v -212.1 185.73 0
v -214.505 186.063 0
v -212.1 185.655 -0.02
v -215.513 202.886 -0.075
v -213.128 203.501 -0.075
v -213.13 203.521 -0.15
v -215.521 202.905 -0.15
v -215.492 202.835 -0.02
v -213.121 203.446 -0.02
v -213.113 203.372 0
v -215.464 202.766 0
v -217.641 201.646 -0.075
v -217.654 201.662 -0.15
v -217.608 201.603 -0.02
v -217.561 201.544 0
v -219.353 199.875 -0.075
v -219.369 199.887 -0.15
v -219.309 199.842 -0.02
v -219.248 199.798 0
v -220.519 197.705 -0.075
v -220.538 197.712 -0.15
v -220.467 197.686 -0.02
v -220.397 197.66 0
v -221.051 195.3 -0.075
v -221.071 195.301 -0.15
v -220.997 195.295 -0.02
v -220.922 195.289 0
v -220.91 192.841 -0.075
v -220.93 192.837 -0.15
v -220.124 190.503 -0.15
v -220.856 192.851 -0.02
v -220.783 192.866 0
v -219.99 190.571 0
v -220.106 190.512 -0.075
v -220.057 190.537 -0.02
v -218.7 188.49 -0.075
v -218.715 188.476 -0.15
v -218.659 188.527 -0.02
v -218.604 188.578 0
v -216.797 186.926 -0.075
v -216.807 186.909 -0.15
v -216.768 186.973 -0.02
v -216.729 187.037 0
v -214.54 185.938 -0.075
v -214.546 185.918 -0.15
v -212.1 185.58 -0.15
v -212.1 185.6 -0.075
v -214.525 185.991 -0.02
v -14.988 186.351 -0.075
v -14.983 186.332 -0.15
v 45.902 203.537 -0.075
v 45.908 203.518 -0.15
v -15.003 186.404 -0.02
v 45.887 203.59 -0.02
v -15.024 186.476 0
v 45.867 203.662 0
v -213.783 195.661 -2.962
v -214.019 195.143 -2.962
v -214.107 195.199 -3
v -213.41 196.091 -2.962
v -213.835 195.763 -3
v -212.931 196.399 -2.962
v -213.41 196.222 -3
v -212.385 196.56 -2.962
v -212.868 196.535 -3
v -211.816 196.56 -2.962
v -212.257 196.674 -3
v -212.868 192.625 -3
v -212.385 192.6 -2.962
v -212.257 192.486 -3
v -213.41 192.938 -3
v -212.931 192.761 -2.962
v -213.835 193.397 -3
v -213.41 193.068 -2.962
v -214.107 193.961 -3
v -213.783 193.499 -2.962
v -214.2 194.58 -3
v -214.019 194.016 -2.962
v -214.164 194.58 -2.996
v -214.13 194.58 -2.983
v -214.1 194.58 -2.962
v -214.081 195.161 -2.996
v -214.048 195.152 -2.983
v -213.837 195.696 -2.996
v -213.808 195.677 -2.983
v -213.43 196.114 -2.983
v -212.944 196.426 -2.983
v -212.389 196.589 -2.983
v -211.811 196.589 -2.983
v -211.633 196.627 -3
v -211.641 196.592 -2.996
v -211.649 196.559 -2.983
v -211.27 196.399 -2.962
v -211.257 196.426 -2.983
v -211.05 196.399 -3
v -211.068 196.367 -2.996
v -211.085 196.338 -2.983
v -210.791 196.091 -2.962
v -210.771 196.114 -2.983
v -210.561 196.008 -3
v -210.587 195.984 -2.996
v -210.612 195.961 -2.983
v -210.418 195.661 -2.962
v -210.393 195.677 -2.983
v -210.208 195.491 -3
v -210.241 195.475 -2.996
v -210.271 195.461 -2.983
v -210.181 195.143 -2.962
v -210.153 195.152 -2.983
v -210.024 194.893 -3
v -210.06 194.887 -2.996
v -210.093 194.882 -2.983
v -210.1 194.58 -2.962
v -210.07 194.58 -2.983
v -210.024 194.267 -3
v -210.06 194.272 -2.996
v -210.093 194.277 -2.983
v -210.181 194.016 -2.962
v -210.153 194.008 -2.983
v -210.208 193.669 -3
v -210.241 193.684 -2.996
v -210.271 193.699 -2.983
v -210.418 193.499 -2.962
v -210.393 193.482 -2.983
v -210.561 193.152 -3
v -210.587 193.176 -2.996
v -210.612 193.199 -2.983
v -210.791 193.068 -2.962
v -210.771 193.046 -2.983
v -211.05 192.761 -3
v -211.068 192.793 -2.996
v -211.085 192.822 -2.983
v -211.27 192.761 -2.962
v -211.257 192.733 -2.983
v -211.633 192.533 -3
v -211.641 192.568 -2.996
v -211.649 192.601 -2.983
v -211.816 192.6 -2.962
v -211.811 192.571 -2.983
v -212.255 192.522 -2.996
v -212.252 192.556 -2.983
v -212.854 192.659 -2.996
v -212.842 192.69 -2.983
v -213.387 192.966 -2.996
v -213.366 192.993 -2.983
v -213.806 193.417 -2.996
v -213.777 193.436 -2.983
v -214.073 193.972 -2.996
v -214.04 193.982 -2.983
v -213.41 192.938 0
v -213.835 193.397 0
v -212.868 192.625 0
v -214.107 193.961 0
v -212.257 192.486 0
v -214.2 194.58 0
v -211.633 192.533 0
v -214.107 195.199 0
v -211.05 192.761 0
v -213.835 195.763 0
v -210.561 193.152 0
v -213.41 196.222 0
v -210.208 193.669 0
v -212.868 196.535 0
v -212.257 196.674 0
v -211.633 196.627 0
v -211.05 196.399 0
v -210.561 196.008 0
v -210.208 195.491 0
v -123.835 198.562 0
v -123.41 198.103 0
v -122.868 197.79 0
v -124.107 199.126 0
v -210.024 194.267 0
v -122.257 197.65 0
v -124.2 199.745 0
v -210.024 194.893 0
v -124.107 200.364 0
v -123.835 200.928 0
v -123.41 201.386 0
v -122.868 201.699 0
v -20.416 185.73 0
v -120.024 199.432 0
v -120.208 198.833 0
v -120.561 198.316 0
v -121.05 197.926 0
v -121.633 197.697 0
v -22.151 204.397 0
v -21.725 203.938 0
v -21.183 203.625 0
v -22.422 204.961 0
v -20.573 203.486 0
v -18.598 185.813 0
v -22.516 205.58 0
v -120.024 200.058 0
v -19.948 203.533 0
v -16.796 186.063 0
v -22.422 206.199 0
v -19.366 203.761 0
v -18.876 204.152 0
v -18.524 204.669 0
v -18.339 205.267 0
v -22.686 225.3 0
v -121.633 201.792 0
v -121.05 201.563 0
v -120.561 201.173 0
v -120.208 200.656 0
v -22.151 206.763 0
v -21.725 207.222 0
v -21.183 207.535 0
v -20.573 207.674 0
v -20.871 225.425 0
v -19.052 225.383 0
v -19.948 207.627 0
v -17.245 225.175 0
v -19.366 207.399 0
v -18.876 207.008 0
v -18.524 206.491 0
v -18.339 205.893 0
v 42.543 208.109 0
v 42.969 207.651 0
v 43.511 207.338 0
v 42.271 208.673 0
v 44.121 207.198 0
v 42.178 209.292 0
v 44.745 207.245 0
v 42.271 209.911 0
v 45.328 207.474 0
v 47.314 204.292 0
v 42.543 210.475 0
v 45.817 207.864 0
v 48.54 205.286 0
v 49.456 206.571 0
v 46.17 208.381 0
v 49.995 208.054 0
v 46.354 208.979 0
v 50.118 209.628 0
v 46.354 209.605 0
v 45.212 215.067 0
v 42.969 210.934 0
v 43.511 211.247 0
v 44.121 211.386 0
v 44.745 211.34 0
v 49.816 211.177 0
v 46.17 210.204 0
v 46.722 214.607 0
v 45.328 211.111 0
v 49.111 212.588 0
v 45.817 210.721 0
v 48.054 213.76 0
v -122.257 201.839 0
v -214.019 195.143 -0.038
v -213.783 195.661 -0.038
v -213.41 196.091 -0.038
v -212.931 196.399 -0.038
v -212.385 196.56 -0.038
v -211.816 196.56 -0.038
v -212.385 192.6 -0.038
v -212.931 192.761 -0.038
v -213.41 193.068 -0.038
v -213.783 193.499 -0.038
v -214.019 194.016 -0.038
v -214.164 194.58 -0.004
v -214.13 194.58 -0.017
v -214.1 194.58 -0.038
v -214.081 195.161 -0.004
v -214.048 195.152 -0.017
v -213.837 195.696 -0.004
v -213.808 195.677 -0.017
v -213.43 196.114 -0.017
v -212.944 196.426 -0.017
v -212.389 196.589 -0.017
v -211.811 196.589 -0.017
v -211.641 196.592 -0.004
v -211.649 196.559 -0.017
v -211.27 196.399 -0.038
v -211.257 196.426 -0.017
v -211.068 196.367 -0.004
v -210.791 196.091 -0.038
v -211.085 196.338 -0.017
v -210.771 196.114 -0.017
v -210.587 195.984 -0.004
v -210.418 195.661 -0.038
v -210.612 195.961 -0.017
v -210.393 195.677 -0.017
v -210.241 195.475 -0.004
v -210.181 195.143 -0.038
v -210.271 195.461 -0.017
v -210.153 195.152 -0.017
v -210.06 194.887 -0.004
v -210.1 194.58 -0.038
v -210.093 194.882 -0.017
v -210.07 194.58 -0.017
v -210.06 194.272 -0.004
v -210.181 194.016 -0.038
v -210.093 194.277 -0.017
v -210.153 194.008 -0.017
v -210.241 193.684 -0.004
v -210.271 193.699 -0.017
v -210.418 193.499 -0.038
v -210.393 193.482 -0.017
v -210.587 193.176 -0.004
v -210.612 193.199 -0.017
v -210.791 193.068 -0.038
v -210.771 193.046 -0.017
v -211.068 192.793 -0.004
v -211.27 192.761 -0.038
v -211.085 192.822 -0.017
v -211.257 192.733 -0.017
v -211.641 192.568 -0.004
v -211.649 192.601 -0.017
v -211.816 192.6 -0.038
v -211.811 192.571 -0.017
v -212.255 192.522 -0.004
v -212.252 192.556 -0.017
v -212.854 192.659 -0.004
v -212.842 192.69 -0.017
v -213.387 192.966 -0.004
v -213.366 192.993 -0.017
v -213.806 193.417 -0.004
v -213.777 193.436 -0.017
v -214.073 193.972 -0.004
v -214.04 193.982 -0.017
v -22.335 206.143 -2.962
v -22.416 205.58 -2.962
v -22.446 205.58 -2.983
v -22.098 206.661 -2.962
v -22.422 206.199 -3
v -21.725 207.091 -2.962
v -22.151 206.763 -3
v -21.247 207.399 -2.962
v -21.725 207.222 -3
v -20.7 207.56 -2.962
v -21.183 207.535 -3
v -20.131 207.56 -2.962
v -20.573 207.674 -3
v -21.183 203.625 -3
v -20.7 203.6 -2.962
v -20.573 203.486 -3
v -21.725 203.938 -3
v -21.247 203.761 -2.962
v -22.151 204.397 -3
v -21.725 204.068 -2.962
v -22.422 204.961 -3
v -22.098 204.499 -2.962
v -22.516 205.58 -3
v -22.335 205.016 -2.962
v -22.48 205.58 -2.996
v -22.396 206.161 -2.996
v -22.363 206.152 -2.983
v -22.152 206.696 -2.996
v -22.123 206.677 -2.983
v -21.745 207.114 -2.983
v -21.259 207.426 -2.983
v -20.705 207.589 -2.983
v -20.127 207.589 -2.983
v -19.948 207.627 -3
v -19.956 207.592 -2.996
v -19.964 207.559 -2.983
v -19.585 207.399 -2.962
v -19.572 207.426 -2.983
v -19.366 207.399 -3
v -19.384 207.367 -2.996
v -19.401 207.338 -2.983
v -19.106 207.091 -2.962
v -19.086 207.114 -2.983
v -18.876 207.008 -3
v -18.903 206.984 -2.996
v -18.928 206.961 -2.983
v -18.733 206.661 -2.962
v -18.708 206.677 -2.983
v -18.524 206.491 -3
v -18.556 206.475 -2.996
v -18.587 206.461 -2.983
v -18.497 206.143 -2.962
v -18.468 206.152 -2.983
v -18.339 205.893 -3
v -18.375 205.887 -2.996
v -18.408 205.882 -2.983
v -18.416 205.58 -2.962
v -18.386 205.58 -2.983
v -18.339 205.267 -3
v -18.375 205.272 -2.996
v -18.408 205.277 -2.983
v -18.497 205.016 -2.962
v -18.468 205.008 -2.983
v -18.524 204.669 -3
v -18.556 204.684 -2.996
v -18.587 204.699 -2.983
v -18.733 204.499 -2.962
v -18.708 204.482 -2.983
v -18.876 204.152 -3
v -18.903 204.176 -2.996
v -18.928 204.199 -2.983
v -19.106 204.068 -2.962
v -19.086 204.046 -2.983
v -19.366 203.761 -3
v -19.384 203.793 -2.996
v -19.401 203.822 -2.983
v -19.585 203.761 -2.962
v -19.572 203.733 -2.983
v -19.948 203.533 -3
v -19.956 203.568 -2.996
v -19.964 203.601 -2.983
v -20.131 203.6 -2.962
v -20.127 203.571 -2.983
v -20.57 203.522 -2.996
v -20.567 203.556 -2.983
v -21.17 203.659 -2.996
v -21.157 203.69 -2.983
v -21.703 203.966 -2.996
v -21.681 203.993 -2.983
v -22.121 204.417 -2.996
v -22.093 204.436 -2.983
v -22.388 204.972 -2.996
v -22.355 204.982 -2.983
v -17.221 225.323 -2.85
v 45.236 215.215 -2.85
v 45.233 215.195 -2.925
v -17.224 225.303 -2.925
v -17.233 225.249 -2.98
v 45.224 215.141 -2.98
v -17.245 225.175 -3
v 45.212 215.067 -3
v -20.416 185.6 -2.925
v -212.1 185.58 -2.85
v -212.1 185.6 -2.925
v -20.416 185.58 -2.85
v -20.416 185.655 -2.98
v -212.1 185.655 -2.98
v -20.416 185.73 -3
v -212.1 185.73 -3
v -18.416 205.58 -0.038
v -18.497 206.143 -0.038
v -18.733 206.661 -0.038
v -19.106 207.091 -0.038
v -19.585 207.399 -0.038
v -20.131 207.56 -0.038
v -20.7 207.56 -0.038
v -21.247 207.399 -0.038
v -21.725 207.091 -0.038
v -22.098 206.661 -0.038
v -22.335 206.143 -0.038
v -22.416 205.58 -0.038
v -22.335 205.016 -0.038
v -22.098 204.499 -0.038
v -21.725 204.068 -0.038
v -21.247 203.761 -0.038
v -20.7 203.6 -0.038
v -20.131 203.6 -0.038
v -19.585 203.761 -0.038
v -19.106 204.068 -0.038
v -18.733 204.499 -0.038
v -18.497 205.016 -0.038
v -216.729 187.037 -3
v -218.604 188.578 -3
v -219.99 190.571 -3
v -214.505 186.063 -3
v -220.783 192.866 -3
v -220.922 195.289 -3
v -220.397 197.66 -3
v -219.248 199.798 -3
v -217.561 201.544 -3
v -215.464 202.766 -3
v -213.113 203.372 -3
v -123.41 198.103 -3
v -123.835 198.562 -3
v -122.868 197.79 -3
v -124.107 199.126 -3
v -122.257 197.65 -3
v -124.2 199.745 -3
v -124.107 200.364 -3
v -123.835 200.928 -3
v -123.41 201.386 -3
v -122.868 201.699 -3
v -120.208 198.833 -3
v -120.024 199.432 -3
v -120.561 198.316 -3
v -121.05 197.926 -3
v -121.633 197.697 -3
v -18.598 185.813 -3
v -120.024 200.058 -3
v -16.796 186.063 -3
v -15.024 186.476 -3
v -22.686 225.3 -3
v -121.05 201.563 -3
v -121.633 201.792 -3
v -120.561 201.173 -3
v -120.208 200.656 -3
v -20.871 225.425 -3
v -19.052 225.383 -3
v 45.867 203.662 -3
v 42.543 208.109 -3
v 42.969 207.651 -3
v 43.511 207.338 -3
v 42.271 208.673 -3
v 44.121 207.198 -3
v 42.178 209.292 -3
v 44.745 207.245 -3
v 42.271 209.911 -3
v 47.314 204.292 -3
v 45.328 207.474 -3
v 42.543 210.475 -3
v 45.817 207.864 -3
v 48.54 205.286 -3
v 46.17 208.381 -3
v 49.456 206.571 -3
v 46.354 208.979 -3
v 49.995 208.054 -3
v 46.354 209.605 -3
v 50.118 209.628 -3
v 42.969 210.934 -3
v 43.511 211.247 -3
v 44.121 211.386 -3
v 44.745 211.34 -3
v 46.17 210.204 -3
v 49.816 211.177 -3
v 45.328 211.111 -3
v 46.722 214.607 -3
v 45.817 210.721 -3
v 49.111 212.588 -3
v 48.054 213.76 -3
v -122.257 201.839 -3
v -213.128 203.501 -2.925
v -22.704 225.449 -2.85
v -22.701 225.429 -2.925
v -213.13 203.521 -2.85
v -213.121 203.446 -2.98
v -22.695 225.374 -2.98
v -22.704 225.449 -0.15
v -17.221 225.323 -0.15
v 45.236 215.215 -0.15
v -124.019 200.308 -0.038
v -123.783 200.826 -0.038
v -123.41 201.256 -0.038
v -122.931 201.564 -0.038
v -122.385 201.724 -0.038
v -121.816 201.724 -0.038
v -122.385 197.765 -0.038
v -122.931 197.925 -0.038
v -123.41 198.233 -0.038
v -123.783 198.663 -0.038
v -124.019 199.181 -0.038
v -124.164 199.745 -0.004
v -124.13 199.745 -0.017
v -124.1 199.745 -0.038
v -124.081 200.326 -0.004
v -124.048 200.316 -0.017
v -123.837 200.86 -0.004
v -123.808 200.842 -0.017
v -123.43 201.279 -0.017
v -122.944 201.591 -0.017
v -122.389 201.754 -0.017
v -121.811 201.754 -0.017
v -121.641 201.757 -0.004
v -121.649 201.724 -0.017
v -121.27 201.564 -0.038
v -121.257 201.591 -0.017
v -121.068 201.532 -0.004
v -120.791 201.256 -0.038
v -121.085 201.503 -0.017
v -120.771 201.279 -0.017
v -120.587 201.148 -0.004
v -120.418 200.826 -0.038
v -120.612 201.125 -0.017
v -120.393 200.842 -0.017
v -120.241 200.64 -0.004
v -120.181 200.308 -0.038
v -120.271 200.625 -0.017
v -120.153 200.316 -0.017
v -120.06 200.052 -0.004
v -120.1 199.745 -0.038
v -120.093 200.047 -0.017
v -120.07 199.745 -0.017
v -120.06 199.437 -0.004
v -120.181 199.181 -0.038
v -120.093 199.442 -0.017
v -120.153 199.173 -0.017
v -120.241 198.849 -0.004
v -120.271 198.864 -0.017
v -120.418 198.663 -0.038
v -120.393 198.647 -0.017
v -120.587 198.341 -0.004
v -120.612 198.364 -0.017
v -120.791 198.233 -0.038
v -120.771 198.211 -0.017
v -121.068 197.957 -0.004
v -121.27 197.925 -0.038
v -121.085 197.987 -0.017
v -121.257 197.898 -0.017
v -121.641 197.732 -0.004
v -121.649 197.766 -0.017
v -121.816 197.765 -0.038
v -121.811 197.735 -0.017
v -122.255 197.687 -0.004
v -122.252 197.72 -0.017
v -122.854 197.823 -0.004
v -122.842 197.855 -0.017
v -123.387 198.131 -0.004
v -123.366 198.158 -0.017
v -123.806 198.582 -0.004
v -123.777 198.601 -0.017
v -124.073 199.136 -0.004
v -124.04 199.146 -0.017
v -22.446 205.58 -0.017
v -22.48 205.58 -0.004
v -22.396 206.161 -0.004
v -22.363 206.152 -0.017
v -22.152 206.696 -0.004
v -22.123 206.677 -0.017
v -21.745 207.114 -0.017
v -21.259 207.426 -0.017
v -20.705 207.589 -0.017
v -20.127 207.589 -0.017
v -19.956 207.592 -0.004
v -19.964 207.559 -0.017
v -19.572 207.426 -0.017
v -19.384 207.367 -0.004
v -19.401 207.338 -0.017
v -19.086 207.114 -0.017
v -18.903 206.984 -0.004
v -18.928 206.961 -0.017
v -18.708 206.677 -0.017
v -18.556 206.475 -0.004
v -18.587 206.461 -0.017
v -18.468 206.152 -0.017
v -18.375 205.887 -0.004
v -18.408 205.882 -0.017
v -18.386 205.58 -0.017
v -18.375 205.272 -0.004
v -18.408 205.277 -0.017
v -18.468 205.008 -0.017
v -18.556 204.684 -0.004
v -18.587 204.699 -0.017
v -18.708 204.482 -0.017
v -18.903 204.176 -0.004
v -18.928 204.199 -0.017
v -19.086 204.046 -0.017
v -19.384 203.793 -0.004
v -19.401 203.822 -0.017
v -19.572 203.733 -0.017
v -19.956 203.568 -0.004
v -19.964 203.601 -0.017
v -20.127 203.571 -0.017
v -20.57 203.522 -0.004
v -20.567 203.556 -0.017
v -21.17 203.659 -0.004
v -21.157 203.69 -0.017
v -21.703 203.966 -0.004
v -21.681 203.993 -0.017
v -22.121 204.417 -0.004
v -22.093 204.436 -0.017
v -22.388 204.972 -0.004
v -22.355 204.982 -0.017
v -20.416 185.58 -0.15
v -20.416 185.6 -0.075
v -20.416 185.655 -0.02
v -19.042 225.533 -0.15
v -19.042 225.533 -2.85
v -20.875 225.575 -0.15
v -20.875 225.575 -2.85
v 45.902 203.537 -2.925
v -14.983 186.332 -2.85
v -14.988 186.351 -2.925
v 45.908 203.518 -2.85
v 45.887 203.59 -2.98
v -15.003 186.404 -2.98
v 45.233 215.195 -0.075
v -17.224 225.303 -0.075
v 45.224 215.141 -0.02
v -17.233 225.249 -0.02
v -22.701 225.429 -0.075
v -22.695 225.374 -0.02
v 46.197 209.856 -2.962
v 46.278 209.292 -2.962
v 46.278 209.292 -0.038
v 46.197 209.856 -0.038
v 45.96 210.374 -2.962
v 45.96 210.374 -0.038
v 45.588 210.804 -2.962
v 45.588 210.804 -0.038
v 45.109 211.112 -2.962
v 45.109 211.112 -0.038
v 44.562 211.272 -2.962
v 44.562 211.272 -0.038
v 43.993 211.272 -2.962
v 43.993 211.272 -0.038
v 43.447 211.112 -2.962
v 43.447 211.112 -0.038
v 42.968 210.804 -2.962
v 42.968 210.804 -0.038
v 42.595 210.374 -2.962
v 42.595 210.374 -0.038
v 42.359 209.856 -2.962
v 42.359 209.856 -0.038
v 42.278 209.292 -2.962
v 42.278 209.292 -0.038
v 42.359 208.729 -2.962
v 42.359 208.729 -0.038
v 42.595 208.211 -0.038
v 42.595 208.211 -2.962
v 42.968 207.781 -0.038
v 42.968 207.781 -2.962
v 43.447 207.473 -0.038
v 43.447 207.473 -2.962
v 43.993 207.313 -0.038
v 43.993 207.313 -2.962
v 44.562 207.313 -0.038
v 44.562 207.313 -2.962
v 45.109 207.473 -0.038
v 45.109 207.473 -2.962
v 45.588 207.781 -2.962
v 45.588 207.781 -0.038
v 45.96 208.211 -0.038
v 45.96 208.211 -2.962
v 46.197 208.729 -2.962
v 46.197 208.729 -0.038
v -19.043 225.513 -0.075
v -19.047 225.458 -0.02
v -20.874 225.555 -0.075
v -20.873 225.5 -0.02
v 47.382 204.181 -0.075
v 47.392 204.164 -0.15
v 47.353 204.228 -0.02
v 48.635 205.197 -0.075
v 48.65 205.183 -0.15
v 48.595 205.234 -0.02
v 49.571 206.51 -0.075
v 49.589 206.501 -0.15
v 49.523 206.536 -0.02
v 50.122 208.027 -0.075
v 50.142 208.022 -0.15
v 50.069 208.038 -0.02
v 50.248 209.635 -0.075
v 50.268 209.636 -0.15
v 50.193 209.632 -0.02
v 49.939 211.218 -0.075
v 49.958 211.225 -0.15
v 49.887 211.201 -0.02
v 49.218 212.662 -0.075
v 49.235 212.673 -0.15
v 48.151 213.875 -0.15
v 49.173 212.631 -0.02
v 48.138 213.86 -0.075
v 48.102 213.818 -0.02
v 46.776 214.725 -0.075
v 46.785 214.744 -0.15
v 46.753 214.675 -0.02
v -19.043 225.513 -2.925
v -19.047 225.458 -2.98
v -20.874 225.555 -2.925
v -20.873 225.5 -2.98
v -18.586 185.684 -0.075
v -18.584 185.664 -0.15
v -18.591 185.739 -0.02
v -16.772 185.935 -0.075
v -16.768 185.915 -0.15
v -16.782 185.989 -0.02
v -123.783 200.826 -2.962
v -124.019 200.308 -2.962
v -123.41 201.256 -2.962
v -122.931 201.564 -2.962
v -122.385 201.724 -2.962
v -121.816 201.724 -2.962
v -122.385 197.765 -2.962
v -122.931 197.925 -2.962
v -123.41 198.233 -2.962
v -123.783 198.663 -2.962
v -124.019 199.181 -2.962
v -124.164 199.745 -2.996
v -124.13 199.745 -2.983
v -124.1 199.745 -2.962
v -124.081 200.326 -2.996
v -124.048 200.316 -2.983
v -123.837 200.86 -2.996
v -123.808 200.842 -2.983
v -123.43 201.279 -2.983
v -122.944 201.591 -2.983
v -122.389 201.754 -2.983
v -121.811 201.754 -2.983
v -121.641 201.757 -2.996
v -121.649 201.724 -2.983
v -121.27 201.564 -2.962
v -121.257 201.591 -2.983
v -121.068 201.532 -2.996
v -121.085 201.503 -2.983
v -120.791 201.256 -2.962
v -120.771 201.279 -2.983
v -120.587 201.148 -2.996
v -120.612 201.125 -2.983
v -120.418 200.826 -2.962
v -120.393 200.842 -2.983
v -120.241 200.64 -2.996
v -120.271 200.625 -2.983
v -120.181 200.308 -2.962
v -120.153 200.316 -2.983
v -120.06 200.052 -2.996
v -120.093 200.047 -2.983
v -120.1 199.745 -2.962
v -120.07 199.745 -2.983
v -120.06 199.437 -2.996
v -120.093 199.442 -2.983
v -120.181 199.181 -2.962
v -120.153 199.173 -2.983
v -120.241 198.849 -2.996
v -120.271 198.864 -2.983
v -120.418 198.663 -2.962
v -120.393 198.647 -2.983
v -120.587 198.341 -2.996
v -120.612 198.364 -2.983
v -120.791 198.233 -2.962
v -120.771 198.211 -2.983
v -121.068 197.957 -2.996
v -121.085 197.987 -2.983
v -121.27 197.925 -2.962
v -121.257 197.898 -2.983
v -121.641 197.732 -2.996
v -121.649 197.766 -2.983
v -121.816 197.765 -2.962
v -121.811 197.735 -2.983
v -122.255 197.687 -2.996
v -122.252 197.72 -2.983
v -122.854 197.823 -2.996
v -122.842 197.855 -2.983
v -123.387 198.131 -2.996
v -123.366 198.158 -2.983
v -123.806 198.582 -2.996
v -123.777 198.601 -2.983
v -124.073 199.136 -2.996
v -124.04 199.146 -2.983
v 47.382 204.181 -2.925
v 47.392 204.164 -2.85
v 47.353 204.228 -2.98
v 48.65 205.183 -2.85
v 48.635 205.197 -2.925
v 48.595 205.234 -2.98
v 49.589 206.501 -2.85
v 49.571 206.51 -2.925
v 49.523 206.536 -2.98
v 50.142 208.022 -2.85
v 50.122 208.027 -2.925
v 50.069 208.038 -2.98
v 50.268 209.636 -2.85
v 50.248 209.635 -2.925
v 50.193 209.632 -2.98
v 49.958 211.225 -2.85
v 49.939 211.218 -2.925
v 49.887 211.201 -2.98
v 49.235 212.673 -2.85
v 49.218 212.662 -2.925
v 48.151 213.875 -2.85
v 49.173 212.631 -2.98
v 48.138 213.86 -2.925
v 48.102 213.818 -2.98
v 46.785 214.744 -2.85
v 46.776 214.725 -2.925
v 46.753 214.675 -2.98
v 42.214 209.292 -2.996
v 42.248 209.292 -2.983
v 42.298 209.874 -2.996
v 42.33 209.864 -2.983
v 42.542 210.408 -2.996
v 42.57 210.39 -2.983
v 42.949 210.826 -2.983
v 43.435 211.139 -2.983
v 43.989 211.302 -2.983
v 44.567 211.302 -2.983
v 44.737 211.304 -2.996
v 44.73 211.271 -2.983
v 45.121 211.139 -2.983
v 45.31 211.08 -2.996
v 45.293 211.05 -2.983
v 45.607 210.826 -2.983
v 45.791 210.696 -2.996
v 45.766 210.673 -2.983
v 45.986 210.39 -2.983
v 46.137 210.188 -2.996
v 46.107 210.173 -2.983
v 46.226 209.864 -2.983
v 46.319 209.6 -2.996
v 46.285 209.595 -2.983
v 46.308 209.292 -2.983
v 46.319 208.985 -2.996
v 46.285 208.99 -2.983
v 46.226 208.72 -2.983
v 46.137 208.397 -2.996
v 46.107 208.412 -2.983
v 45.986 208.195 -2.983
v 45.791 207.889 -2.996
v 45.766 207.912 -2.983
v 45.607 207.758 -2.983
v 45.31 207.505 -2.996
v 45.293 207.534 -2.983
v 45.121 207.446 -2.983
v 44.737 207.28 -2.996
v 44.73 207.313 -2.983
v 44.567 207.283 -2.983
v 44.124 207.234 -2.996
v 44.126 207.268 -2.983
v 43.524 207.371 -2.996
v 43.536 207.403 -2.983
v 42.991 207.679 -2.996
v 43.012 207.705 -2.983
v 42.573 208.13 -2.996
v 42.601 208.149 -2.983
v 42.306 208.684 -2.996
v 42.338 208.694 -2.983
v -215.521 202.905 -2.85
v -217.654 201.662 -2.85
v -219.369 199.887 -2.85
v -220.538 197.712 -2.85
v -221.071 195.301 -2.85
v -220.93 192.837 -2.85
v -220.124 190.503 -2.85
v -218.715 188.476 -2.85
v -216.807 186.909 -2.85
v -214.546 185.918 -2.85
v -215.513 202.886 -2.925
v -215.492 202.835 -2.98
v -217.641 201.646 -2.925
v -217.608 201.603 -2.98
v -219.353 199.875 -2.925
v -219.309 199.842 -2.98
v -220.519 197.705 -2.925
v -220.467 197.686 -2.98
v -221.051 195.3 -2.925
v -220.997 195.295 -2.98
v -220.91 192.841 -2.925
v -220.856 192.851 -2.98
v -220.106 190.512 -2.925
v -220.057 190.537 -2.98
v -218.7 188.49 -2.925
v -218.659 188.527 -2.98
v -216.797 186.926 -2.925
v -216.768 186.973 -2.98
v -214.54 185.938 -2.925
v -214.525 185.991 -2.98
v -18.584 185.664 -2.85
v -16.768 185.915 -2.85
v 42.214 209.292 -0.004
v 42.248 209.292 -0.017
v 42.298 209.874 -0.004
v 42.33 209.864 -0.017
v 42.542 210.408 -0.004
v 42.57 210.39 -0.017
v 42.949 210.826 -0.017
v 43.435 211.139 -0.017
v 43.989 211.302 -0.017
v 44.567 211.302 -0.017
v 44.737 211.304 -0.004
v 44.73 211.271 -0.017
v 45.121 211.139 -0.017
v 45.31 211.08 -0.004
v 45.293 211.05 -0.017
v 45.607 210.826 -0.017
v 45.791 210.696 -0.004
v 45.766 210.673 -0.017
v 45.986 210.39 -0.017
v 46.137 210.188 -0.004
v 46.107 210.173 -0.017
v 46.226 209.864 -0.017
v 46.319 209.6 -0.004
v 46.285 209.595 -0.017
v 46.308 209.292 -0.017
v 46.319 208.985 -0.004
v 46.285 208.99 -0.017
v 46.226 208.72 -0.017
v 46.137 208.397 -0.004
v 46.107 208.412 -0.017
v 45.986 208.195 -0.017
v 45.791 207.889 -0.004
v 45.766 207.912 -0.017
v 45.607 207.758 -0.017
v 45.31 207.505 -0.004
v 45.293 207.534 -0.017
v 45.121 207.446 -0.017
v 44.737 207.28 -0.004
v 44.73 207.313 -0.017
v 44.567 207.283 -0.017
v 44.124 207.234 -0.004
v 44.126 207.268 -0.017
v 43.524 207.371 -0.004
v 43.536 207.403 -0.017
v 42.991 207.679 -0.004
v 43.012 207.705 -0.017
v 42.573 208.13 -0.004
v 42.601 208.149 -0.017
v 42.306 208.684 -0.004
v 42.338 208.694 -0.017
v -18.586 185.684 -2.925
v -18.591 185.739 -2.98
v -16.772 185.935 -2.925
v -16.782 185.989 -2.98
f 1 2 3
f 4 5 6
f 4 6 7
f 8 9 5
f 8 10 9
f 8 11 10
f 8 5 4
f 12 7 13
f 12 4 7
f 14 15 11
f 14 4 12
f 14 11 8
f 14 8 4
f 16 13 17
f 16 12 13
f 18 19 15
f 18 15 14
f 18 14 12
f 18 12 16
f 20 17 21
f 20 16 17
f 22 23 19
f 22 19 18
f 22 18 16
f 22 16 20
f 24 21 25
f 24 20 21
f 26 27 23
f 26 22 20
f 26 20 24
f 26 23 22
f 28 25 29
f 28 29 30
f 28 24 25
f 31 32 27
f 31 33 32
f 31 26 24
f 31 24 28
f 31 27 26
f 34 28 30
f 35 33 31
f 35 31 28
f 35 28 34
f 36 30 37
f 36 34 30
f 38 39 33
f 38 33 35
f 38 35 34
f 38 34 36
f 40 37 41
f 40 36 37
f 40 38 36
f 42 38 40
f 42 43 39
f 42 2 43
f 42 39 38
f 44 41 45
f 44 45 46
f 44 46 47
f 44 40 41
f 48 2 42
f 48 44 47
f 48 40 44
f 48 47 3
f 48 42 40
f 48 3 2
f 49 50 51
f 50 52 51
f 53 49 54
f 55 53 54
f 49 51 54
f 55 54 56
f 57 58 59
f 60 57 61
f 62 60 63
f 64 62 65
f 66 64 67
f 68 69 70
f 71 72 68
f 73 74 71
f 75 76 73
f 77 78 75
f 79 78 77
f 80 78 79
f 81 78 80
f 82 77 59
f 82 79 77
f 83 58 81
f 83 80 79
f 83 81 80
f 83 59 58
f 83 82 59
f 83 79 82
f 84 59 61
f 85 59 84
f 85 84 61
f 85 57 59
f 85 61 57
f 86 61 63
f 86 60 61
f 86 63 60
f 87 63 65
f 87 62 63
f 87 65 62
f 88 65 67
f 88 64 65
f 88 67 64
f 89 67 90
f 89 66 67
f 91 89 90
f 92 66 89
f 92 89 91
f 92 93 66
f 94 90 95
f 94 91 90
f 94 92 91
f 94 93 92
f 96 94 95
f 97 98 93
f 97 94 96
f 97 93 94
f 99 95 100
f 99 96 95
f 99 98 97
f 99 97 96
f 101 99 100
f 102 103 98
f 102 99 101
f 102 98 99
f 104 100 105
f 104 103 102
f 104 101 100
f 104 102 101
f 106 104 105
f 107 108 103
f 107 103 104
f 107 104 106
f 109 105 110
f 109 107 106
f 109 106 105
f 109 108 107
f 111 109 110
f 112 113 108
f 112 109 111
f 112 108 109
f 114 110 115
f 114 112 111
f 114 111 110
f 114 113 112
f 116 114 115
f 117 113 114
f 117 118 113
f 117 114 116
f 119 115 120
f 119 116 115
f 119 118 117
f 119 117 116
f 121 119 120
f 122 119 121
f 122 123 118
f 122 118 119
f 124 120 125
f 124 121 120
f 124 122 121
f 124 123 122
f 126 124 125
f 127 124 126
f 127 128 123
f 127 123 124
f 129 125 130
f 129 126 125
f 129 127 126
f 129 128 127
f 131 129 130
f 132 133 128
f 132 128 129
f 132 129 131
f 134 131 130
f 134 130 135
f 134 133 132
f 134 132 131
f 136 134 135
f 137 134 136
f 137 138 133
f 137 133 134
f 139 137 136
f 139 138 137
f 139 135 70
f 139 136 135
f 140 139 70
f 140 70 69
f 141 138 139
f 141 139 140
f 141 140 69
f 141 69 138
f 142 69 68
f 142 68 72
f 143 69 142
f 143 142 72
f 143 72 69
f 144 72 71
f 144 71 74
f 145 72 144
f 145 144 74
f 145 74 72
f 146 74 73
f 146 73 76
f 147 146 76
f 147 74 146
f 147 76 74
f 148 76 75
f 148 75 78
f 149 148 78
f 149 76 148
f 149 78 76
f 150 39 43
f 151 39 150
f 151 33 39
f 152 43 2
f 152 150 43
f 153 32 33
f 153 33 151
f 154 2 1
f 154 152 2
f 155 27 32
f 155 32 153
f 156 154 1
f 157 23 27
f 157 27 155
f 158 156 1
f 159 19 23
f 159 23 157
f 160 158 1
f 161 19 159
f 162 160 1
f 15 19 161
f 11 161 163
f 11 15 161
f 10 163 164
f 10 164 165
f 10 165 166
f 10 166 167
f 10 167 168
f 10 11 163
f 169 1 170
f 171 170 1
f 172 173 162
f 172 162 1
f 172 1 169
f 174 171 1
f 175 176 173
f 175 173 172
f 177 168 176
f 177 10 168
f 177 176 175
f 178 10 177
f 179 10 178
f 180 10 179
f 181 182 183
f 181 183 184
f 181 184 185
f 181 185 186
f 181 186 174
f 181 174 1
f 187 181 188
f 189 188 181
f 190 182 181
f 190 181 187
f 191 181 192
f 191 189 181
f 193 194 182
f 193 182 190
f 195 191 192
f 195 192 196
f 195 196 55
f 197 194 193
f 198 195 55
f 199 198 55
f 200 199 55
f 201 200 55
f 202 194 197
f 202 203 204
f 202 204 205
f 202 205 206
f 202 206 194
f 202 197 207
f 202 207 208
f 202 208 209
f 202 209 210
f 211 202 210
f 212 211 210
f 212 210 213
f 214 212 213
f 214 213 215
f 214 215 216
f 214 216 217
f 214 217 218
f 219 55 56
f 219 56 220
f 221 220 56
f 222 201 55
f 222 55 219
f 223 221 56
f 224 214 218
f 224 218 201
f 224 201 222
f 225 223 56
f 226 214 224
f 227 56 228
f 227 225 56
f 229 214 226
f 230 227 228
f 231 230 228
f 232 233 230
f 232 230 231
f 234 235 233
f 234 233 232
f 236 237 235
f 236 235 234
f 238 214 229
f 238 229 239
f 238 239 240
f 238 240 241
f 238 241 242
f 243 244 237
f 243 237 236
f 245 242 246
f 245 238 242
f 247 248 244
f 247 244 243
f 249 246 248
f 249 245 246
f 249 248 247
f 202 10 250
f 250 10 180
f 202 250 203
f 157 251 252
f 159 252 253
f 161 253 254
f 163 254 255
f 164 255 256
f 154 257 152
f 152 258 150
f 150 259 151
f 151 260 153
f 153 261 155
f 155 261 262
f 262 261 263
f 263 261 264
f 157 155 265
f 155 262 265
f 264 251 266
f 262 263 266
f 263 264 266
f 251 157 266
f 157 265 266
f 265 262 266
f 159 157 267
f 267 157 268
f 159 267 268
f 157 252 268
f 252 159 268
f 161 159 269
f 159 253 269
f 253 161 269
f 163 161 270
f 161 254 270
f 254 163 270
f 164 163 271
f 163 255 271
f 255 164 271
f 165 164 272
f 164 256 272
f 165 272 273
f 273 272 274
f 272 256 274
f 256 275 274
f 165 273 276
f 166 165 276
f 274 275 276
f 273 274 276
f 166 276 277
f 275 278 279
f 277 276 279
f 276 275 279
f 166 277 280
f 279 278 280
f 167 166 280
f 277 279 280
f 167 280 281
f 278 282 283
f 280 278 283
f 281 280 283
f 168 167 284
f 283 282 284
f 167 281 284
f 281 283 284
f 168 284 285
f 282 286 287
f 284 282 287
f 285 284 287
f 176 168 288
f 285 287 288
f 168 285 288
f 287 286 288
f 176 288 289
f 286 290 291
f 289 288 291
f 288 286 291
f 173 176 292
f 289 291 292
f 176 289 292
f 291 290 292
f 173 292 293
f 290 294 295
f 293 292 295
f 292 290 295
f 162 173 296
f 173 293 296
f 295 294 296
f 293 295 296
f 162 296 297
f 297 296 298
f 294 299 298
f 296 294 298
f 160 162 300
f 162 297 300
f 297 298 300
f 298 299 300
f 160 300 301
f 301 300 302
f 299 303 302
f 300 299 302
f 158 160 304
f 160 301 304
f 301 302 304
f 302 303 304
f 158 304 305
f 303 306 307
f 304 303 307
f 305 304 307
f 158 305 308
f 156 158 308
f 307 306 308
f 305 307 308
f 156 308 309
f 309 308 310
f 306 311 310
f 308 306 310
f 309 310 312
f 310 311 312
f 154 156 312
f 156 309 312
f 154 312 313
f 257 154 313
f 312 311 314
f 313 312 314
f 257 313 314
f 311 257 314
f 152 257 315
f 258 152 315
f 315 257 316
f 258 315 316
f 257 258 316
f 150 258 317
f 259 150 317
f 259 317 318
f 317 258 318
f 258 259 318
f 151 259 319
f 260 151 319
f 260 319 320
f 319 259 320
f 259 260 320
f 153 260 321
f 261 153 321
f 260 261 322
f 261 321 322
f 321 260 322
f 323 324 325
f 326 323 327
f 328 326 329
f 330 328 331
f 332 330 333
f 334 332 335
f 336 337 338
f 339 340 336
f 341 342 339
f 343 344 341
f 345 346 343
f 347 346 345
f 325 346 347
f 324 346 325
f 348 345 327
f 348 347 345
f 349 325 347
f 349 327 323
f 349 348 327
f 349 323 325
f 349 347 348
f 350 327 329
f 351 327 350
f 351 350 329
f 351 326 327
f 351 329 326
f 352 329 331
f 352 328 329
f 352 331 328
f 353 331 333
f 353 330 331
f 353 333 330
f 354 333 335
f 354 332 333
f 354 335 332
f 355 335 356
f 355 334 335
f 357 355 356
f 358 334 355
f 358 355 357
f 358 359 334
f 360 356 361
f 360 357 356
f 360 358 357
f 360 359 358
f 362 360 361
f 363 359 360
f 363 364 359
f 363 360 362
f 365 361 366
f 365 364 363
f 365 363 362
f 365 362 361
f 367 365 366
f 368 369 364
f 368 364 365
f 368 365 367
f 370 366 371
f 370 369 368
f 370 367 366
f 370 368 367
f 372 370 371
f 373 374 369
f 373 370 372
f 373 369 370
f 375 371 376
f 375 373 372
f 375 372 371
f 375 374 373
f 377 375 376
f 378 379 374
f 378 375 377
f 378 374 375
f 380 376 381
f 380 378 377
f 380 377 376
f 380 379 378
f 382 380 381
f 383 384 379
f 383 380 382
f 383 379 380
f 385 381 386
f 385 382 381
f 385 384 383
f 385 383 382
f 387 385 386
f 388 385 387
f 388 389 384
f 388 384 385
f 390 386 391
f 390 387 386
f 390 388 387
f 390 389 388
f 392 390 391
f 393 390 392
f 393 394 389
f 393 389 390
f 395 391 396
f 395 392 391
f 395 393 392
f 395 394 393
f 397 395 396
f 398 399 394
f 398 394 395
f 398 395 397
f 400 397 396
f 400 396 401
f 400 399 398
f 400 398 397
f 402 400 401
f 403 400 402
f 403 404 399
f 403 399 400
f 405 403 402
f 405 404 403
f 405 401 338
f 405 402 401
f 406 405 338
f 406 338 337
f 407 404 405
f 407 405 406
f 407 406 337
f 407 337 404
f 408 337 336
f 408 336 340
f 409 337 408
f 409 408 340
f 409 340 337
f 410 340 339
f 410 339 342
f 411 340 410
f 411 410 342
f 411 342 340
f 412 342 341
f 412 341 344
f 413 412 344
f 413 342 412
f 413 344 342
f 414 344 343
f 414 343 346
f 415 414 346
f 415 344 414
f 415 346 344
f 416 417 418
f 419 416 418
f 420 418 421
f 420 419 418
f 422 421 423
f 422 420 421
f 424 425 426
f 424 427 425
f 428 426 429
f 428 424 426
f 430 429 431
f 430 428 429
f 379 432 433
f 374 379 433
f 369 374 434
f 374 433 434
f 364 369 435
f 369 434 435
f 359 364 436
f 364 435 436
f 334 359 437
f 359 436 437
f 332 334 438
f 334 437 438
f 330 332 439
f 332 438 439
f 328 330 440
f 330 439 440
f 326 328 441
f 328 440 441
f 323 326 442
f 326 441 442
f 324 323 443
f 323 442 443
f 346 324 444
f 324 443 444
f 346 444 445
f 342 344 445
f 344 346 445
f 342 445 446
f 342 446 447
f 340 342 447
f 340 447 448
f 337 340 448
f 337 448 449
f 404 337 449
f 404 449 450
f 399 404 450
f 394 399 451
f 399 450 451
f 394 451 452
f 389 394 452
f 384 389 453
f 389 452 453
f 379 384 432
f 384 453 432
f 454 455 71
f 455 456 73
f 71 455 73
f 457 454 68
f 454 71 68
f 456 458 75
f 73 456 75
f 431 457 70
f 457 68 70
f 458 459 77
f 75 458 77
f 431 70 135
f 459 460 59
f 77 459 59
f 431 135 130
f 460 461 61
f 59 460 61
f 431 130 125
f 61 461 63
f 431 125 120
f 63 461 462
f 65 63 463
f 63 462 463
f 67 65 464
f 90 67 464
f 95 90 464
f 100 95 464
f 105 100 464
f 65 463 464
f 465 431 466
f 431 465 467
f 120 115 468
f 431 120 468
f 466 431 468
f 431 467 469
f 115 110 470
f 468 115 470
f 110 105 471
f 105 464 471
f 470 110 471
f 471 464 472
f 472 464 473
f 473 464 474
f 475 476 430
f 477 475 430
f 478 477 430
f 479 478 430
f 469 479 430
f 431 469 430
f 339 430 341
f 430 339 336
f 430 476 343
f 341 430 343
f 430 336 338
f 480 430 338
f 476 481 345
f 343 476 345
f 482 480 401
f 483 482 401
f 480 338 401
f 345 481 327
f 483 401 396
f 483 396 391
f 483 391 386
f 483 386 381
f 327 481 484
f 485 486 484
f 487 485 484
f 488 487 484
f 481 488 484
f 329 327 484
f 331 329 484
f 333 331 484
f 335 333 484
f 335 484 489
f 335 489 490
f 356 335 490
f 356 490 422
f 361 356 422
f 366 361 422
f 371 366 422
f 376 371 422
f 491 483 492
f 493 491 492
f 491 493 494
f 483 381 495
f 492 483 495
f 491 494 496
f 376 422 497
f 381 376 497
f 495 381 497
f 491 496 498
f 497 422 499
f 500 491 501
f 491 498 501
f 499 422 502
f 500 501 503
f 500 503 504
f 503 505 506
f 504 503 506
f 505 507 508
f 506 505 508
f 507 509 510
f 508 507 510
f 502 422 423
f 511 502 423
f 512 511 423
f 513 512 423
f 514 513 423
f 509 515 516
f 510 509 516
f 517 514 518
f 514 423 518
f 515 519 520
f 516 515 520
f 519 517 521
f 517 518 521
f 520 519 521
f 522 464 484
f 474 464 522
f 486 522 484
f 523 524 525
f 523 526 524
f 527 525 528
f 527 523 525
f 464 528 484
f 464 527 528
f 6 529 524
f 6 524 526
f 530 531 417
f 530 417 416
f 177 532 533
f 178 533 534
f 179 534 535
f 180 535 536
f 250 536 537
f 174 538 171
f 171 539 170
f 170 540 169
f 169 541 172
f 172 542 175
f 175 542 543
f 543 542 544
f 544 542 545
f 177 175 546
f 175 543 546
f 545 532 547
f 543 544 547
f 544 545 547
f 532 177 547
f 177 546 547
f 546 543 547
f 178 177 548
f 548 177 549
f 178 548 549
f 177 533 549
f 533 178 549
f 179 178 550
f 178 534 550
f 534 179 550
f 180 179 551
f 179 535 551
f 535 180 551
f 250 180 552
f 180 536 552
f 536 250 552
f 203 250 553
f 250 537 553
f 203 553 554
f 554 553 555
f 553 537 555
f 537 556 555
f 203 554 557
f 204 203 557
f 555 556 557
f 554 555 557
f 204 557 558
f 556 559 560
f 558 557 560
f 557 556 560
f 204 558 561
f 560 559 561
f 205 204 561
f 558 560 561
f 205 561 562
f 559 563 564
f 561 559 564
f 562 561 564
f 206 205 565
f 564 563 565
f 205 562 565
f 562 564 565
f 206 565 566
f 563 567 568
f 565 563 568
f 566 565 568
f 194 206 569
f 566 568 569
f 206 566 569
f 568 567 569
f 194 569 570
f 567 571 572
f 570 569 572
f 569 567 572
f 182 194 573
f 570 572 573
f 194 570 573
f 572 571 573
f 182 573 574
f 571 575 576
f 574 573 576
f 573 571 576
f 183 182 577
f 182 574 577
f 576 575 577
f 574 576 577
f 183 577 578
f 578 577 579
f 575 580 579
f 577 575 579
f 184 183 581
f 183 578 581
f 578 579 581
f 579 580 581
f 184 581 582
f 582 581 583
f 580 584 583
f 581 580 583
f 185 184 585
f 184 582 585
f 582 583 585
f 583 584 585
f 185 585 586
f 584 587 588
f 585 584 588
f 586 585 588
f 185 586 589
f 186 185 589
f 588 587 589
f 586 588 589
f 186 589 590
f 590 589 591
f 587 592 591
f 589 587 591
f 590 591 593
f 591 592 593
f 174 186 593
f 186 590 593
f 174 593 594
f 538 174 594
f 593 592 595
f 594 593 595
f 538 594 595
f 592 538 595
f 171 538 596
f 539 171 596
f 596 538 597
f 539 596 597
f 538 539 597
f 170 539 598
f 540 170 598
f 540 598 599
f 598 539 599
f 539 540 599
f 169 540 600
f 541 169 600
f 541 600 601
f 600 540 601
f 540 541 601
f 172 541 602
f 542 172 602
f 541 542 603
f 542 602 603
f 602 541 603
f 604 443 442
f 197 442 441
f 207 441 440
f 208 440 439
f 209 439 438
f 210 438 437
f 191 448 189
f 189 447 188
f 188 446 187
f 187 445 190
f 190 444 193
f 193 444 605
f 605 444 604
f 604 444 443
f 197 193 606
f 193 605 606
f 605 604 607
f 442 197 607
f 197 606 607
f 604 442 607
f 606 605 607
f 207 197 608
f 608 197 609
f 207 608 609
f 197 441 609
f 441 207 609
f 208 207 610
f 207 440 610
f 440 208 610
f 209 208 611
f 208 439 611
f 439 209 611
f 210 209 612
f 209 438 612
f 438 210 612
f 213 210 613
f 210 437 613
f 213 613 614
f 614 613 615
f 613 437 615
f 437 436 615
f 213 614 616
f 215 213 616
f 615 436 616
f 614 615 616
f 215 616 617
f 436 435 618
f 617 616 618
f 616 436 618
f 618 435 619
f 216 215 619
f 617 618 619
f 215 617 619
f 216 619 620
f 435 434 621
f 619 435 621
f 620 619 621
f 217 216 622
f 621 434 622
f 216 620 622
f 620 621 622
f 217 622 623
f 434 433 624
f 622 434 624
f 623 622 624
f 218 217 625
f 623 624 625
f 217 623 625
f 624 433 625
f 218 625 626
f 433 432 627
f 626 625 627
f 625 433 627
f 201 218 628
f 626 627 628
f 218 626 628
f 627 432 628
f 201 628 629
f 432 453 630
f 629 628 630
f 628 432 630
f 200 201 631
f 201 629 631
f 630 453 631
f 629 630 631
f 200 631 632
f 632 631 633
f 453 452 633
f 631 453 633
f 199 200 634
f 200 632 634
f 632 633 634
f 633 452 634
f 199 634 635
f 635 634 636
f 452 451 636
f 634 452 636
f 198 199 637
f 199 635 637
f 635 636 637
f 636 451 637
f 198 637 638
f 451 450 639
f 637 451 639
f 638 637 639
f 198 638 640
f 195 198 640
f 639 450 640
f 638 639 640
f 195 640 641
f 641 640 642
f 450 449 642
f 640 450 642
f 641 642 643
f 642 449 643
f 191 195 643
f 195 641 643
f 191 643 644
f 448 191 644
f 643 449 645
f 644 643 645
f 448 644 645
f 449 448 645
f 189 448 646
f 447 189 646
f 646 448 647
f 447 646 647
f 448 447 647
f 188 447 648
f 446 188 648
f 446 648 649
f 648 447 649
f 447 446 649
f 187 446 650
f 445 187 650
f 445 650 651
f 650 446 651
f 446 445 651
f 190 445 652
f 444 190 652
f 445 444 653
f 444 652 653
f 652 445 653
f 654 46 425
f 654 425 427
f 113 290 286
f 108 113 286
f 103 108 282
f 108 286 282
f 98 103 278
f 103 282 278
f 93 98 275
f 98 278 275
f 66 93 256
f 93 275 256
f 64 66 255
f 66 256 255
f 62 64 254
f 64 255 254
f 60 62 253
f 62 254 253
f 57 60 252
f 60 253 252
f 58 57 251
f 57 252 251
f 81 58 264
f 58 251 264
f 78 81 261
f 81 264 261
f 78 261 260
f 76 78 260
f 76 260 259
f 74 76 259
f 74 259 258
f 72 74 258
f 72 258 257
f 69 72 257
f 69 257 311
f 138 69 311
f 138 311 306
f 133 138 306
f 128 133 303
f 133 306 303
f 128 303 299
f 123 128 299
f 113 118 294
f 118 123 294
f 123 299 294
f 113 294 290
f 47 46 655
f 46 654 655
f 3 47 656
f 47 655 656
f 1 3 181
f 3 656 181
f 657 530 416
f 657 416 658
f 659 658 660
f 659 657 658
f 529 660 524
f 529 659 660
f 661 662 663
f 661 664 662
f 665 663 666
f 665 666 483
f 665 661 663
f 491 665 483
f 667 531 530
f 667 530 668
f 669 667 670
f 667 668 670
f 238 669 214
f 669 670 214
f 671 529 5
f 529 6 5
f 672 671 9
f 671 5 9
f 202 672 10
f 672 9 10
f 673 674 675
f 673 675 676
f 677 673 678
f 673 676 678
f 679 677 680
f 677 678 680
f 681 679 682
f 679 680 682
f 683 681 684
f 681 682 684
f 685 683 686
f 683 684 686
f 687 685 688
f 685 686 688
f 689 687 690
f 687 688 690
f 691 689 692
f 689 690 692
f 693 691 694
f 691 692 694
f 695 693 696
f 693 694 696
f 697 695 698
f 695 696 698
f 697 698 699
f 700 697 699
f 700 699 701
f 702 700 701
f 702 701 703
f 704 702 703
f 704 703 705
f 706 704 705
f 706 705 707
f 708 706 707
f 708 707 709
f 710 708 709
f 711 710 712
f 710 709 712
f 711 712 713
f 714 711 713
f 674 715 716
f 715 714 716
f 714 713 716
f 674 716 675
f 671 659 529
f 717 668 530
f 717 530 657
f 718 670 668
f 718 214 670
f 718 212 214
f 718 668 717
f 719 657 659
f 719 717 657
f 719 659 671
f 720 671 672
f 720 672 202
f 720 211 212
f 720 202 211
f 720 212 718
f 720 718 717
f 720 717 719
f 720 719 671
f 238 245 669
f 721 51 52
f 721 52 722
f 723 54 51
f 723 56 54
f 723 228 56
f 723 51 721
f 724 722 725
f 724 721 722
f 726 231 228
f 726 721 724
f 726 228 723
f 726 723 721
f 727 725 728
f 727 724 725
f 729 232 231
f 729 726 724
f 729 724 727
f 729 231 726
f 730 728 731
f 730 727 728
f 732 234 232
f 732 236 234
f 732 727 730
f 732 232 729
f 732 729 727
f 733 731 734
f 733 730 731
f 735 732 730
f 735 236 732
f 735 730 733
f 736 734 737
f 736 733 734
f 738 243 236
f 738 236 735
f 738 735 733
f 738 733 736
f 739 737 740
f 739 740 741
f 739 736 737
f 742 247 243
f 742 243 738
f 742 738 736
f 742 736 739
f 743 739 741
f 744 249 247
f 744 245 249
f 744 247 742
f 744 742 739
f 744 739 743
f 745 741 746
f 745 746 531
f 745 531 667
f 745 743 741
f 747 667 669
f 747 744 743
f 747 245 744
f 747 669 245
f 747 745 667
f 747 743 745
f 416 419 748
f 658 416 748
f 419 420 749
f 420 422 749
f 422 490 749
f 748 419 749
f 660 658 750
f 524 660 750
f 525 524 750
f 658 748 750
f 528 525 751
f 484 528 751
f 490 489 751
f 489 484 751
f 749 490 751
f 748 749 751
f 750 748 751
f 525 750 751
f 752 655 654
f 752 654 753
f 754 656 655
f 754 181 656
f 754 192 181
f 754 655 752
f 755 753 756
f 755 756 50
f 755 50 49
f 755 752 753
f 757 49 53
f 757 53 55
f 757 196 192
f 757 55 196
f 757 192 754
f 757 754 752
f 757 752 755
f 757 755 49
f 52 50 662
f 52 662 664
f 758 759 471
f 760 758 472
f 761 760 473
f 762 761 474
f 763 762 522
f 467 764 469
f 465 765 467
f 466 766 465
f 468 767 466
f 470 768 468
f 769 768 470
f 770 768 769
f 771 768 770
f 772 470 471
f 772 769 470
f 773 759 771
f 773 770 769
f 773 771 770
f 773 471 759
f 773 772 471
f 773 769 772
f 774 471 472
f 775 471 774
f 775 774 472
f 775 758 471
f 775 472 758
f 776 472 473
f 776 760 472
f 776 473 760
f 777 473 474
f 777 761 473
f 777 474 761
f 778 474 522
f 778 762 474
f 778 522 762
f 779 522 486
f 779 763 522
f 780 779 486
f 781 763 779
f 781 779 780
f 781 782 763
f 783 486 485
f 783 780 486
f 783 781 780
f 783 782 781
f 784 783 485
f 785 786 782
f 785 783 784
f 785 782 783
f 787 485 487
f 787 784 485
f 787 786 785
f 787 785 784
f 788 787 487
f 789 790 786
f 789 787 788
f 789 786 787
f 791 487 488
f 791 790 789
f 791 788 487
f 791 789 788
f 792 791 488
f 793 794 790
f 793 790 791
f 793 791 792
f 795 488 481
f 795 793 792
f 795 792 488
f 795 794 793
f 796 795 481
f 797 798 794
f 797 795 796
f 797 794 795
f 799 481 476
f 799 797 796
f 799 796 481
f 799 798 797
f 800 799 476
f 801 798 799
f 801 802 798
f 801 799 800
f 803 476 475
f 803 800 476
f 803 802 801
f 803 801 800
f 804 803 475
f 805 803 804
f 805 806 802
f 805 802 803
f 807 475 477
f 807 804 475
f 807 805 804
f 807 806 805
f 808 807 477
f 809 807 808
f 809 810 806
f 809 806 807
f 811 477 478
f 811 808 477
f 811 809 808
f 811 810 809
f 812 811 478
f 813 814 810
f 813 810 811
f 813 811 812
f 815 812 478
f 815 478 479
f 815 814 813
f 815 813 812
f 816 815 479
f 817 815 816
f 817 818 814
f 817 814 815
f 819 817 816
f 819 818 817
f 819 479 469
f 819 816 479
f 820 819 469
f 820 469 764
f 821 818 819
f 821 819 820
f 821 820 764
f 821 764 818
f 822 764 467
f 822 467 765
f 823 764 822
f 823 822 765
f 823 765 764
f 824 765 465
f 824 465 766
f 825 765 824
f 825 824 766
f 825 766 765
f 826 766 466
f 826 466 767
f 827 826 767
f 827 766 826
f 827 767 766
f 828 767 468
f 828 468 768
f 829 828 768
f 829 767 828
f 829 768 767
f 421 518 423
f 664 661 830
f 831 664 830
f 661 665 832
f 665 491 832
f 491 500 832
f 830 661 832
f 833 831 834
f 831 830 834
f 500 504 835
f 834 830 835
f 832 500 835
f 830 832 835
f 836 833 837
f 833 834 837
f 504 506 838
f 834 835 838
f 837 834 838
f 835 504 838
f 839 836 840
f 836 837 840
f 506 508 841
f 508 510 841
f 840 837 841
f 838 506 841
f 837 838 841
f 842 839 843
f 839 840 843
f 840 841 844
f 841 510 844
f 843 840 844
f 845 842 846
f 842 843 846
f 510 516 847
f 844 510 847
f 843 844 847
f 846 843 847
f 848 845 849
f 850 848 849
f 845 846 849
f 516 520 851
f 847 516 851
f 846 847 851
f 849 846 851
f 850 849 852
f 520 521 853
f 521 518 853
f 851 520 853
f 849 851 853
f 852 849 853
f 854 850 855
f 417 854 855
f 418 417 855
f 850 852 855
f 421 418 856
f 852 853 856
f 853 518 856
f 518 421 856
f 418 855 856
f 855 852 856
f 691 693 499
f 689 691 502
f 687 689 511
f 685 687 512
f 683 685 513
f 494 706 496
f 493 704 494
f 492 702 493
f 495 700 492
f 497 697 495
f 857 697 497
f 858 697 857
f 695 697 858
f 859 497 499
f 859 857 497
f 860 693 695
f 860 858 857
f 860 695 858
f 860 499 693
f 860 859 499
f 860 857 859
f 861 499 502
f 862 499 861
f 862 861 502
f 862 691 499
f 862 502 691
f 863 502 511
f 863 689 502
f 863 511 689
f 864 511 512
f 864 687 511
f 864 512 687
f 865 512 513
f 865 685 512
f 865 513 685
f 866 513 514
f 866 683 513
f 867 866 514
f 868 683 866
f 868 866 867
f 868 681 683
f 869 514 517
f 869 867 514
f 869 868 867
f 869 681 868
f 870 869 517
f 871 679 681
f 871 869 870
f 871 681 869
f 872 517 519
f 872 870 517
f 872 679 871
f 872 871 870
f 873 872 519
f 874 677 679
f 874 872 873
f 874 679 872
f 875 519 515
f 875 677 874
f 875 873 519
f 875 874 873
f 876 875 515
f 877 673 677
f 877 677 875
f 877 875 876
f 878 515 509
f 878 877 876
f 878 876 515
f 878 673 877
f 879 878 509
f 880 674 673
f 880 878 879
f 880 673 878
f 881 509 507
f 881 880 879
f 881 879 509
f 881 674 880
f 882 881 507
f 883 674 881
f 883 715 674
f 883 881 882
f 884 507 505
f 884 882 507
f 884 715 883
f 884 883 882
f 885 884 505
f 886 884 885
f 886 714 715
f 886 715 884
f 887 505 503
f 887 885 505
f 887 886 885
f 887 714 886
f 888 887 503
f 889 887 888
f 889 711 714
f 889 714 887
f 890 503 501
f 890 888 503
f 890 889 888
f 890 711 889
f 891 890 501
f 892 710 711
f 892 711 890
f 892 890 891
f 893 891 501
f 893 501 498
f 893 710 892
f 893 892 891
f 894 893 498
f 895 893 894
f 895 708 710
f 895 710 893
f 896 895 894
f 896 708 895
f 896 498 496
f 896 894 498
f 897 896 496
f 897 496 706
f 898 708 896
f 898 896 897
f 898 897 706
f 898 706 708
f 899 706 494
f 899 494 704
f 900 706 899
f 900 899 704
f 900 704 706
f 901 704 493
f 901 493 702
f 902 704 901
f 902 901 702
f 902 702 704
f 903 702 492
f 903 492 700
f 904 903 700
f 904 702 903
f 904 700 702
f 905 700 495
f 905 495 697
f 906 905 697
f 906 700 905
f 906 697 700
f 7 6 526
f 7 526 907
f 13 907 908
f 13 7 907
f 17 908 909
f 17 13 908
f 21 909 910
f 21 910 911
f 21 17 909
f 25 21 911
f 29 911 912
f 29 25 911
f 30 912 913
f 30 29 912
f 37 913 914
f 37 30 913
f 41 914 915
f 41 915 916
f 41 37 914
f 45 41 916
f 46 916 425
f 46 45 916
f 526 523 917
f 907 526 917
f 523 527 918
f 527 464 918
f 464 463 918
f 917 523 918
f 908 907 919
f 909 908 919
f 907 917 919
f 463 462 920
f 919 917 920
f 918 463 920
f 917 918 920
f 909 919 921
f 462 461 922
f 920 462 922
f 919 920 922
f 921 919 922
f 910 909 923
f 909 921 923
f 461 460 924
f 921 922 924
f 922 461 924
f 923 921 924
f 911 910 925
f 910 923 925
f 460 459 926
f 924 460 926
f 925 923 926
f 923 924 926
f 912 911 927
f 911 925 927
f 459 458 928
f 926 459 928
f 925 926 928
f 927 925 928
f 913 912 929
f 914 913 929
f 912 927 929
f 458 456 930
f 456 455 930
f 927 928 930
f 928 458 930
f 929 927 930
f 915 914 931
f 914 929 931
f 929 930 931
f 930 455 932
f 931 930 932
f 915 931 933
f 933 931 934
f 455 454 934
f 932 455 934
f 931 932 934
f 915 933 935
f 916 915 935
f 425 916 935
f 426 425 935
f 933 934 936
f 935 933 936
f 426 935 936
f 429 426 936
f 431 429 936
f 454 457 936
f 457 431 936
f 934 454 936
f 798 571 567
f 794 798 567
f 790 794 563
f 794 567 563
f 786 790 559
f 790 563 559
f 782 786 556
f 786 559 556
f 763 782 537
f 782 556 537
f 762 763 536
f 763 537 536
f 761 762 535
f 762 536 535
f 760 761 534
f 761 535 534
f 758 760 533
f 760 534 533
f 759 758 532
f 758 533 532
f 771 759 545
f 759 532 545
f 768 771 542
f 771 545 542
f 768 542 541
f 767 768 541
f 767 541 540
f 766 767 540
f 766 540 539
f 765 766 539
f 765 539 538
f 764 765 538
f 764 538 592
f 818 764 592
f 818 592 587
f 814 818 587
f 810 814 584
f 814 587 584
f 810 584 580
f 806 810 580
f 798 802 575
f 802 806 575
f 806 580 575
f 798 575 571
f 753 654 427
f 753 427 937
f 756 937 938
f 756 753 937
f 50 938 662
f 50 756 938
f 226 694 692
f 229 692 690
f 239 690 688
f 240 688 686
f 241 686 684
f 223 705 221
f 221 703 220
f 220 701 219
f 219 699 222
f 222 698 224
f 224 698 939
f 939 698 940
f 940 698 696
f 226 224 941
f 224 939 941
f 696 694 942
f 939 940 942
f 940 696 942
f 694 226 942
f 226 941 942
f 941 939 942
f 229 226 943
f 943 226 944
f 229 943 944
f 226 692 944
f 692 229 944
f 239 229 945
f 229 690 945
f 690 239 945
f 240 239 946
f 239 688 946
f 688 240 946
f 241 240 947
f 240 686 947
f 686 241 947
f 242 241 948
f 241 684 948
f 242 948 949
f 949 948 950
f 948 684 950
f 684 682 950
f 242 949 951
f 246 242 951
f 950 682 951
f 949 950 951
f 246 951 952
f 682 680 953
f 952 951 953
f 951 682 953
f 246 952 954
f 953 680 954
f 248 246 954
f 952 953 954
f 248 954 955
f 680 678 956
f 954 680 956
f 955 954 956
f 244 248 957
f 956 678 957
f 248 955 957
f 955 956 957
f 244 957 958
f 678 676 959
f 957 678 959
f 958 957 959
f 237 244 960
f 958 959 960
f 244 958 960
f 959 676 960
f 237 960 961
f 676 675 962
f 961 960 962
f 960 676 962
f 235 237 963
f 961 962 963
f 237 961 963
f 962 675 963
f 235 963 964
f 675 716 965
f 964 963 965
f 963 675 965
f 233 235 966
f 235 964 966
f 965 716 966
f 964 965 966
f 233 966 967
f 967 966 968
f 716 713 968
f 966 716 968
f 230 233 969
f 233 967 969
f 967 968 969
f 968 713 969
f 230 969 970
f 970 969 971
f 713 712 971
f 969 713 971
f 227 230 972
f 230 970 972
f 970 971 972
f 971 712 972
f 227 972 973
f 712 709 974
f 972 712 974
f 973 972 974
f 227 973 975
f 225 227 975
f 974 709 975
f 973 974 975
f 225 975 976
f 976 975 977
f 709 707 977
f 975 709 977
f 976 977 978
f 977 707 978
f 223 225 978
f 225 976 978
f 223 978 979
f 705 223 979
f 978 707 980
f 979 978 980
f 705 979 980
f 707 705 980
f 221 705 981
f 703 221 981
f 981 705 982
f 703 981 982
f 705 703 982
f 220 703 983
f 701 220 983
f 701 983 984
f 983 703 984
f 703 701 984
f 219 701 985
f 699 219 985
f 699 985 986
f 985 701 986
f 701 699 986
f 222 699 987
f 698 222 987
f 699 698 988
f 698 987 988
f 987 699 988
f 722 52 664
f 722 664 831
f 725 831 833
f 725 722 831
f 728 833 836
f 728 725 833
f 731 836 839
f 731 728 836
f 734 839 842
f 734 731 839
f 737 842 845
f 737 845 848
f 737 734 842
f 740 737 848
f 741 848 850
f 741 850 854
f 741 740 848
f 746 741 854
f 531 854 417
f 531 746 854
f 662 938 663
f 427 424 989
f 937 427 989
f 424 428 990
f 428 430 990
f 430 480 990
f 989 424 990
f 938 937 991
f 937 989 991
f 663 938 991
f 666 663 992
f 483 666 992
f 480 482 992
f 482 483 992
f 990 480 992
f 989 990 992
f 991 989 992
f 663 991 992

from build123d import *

# Parameters (mm, degrees)
BOSS_EXTRUDE1_DEPTH        = 3
M3_5_CLEARANCE_HOLE1_D     = 3.9
M3_5_CLEARANCE_HOLE1_DEPTH = 10
M3_5_CLEARANCE_HOLE1_TIP   = 1.171678207
FILLET1_R                  = 0.15
SKETCH_1_R                 = 2
CUT_EXTRUDE_1_DEPTH        = 10
SKETCH_2_R                 = 2
CUT_EXTRUDE_2_DEPTH        = 10
SKETCH_3_R                 = 2
CUT_EXTRUDE_3_DEPTH        = 10


with BuildPart() as part:
    # Sketch1 → Boss-Extrude1 (new body)
    with BuildSketch(Plane.XY):
        with BuildLine():
            Line((-14.983034782, 186.331852937), (45.907666819, 203.517965313))
            ThreePointArc((45.907666819, 203.517965313), (50.268013149, 209.636120617), (45.236403893, 215.215309872))
            Line((45.236403893, 215.215309872), (-17.220577868, 225.323001467))
            ThreePointArc((-17.220577868, 225.323001467), (-19.957763668, 225.574627364), (-22.703599252, 225.448577215))
            Line((-22.703599252, 225.448577215), (-213.129889679, 203.520788586))
            ThreePointArc((-213.129889679, 203.520788586), (-221.085550876, 194.064245617), (-212.100333524, 185.579870617))
            Line((-212.100333524, 185.579870617), (-20.415696686, 185.579870617))
            ThreePointArc((-20.415696686, 185.579870617), (-17.673467083, 185.76875816), (-14.983034782, 186.331852937))
        make_face()
    extrude(amount=-BOSS_EXTRUDE1_DEPTH)

    # M3.5 Clearance Hole1
    with Locations(Plane.XY):
        with Locations((44.277868248, 209.292370617), (-20.415696686, 205.579870617), (-52.165696686, -1330.164308971), (-122.100333524, 199.744603777), (-212.100333524, 194.579870617)):
            Hole(M3_5_CLEARANCE_HOLE1_D / 2, depth=M3_5_CLEARANCE_HOLE1_DEPTH)
            with Locations((0, 0, -(M3_5_CLEARANCE_HOLE1_DEPTH + M3_5_CLEARANCE_HOLE1_TIP / 2))):  # 118° drill point
                Cone(0, M3_5_CLEARANCE_HOLE1_D / 2, M3_5_CLEARANCE_HOLE1_TIP, mode=Mode.SUBTRACT)

    # Fillet1
    fillet1_edges = [part.edges().sort_by_distance(p)[0] for p in [
        (50.268013149, 209.636120617, -3),
        (15.462316019, 194.924909125, 0),
        (-17.673467083, 185.76875816, 0),
        (14.007913013, 220.26915567, -3),
        (-19.957763668, 225.574627364, -3),
        (-117.916744466, 214.4846829, -3),
        (-221.085550876, 194.064245617, -3),
        (-116.258015105, 185.579870617, -3),
        (-210.150333524, 194.579870617, -3),
        (-210.150333524, 194.579870617, 0),
        (-120.150333524, 199.744603777, -3),
        (-120.150333524, 199.744603777, 0),
        (-18.465696686, 205.579870617, -3),
        (-18.465696686, 205.579870617, 0),
        (-17.673467083, 185.76875816, -3),
        (46.227868248, 209.292370617, -3),
        (46.227868248, 209.292370617, 0),
        (15.462316019, 194.924909125, -3),
        (-116.258015105, 185.579870617, 0),
        (-221.085550876, 194.064245617, 0),
        (-117.916744466, 214.4846829, 0),
        (-19.957763668, 225.574627364, 0),
        (14.007913013, 220.26915567, 0),
        (50.268013149, 209.636120617, 0),
    ]]
    fillet(fillet1_edges, radius=FILLET1_R)

    # 草图1 → 切除-拉伸1 (cut)
    with BuildSketch(Plane.XY):
        with Locations((-20.415696686, 205.579870617)):
            Circle(SKETCH_1_R)
    extrude(amount=-CUT_EXTRUDE_1_DEPTH, mode=Mode.SUBTRACT)

    # 草图2 → 切除-拉伸2 (cut)
    with BuildSketch(Plane.XY):
        with Locations((44.277868248, 209.292370617)):
            Circle(SKETCH_2_R)
    extrude(amount=-CUT_EXTRUDE_2_DEPTH, mode=Mode.SUBTRACT)

    # 草图3 → 切除-拉伸3 (cut)
    with BuildSketch(Plane.XY):
        with Locations((-122.100333524, 199.744603777)):
            Circle(SKETCH_3_R)
        with Locations((-212.100333524, 194.579870617)):
            Circle(SKETCH_3_R)
    extrude(amount=-CUT_EXTRUDE_3_DEPTH, mode=Mode.SUBTRACT)


solid = part.part
